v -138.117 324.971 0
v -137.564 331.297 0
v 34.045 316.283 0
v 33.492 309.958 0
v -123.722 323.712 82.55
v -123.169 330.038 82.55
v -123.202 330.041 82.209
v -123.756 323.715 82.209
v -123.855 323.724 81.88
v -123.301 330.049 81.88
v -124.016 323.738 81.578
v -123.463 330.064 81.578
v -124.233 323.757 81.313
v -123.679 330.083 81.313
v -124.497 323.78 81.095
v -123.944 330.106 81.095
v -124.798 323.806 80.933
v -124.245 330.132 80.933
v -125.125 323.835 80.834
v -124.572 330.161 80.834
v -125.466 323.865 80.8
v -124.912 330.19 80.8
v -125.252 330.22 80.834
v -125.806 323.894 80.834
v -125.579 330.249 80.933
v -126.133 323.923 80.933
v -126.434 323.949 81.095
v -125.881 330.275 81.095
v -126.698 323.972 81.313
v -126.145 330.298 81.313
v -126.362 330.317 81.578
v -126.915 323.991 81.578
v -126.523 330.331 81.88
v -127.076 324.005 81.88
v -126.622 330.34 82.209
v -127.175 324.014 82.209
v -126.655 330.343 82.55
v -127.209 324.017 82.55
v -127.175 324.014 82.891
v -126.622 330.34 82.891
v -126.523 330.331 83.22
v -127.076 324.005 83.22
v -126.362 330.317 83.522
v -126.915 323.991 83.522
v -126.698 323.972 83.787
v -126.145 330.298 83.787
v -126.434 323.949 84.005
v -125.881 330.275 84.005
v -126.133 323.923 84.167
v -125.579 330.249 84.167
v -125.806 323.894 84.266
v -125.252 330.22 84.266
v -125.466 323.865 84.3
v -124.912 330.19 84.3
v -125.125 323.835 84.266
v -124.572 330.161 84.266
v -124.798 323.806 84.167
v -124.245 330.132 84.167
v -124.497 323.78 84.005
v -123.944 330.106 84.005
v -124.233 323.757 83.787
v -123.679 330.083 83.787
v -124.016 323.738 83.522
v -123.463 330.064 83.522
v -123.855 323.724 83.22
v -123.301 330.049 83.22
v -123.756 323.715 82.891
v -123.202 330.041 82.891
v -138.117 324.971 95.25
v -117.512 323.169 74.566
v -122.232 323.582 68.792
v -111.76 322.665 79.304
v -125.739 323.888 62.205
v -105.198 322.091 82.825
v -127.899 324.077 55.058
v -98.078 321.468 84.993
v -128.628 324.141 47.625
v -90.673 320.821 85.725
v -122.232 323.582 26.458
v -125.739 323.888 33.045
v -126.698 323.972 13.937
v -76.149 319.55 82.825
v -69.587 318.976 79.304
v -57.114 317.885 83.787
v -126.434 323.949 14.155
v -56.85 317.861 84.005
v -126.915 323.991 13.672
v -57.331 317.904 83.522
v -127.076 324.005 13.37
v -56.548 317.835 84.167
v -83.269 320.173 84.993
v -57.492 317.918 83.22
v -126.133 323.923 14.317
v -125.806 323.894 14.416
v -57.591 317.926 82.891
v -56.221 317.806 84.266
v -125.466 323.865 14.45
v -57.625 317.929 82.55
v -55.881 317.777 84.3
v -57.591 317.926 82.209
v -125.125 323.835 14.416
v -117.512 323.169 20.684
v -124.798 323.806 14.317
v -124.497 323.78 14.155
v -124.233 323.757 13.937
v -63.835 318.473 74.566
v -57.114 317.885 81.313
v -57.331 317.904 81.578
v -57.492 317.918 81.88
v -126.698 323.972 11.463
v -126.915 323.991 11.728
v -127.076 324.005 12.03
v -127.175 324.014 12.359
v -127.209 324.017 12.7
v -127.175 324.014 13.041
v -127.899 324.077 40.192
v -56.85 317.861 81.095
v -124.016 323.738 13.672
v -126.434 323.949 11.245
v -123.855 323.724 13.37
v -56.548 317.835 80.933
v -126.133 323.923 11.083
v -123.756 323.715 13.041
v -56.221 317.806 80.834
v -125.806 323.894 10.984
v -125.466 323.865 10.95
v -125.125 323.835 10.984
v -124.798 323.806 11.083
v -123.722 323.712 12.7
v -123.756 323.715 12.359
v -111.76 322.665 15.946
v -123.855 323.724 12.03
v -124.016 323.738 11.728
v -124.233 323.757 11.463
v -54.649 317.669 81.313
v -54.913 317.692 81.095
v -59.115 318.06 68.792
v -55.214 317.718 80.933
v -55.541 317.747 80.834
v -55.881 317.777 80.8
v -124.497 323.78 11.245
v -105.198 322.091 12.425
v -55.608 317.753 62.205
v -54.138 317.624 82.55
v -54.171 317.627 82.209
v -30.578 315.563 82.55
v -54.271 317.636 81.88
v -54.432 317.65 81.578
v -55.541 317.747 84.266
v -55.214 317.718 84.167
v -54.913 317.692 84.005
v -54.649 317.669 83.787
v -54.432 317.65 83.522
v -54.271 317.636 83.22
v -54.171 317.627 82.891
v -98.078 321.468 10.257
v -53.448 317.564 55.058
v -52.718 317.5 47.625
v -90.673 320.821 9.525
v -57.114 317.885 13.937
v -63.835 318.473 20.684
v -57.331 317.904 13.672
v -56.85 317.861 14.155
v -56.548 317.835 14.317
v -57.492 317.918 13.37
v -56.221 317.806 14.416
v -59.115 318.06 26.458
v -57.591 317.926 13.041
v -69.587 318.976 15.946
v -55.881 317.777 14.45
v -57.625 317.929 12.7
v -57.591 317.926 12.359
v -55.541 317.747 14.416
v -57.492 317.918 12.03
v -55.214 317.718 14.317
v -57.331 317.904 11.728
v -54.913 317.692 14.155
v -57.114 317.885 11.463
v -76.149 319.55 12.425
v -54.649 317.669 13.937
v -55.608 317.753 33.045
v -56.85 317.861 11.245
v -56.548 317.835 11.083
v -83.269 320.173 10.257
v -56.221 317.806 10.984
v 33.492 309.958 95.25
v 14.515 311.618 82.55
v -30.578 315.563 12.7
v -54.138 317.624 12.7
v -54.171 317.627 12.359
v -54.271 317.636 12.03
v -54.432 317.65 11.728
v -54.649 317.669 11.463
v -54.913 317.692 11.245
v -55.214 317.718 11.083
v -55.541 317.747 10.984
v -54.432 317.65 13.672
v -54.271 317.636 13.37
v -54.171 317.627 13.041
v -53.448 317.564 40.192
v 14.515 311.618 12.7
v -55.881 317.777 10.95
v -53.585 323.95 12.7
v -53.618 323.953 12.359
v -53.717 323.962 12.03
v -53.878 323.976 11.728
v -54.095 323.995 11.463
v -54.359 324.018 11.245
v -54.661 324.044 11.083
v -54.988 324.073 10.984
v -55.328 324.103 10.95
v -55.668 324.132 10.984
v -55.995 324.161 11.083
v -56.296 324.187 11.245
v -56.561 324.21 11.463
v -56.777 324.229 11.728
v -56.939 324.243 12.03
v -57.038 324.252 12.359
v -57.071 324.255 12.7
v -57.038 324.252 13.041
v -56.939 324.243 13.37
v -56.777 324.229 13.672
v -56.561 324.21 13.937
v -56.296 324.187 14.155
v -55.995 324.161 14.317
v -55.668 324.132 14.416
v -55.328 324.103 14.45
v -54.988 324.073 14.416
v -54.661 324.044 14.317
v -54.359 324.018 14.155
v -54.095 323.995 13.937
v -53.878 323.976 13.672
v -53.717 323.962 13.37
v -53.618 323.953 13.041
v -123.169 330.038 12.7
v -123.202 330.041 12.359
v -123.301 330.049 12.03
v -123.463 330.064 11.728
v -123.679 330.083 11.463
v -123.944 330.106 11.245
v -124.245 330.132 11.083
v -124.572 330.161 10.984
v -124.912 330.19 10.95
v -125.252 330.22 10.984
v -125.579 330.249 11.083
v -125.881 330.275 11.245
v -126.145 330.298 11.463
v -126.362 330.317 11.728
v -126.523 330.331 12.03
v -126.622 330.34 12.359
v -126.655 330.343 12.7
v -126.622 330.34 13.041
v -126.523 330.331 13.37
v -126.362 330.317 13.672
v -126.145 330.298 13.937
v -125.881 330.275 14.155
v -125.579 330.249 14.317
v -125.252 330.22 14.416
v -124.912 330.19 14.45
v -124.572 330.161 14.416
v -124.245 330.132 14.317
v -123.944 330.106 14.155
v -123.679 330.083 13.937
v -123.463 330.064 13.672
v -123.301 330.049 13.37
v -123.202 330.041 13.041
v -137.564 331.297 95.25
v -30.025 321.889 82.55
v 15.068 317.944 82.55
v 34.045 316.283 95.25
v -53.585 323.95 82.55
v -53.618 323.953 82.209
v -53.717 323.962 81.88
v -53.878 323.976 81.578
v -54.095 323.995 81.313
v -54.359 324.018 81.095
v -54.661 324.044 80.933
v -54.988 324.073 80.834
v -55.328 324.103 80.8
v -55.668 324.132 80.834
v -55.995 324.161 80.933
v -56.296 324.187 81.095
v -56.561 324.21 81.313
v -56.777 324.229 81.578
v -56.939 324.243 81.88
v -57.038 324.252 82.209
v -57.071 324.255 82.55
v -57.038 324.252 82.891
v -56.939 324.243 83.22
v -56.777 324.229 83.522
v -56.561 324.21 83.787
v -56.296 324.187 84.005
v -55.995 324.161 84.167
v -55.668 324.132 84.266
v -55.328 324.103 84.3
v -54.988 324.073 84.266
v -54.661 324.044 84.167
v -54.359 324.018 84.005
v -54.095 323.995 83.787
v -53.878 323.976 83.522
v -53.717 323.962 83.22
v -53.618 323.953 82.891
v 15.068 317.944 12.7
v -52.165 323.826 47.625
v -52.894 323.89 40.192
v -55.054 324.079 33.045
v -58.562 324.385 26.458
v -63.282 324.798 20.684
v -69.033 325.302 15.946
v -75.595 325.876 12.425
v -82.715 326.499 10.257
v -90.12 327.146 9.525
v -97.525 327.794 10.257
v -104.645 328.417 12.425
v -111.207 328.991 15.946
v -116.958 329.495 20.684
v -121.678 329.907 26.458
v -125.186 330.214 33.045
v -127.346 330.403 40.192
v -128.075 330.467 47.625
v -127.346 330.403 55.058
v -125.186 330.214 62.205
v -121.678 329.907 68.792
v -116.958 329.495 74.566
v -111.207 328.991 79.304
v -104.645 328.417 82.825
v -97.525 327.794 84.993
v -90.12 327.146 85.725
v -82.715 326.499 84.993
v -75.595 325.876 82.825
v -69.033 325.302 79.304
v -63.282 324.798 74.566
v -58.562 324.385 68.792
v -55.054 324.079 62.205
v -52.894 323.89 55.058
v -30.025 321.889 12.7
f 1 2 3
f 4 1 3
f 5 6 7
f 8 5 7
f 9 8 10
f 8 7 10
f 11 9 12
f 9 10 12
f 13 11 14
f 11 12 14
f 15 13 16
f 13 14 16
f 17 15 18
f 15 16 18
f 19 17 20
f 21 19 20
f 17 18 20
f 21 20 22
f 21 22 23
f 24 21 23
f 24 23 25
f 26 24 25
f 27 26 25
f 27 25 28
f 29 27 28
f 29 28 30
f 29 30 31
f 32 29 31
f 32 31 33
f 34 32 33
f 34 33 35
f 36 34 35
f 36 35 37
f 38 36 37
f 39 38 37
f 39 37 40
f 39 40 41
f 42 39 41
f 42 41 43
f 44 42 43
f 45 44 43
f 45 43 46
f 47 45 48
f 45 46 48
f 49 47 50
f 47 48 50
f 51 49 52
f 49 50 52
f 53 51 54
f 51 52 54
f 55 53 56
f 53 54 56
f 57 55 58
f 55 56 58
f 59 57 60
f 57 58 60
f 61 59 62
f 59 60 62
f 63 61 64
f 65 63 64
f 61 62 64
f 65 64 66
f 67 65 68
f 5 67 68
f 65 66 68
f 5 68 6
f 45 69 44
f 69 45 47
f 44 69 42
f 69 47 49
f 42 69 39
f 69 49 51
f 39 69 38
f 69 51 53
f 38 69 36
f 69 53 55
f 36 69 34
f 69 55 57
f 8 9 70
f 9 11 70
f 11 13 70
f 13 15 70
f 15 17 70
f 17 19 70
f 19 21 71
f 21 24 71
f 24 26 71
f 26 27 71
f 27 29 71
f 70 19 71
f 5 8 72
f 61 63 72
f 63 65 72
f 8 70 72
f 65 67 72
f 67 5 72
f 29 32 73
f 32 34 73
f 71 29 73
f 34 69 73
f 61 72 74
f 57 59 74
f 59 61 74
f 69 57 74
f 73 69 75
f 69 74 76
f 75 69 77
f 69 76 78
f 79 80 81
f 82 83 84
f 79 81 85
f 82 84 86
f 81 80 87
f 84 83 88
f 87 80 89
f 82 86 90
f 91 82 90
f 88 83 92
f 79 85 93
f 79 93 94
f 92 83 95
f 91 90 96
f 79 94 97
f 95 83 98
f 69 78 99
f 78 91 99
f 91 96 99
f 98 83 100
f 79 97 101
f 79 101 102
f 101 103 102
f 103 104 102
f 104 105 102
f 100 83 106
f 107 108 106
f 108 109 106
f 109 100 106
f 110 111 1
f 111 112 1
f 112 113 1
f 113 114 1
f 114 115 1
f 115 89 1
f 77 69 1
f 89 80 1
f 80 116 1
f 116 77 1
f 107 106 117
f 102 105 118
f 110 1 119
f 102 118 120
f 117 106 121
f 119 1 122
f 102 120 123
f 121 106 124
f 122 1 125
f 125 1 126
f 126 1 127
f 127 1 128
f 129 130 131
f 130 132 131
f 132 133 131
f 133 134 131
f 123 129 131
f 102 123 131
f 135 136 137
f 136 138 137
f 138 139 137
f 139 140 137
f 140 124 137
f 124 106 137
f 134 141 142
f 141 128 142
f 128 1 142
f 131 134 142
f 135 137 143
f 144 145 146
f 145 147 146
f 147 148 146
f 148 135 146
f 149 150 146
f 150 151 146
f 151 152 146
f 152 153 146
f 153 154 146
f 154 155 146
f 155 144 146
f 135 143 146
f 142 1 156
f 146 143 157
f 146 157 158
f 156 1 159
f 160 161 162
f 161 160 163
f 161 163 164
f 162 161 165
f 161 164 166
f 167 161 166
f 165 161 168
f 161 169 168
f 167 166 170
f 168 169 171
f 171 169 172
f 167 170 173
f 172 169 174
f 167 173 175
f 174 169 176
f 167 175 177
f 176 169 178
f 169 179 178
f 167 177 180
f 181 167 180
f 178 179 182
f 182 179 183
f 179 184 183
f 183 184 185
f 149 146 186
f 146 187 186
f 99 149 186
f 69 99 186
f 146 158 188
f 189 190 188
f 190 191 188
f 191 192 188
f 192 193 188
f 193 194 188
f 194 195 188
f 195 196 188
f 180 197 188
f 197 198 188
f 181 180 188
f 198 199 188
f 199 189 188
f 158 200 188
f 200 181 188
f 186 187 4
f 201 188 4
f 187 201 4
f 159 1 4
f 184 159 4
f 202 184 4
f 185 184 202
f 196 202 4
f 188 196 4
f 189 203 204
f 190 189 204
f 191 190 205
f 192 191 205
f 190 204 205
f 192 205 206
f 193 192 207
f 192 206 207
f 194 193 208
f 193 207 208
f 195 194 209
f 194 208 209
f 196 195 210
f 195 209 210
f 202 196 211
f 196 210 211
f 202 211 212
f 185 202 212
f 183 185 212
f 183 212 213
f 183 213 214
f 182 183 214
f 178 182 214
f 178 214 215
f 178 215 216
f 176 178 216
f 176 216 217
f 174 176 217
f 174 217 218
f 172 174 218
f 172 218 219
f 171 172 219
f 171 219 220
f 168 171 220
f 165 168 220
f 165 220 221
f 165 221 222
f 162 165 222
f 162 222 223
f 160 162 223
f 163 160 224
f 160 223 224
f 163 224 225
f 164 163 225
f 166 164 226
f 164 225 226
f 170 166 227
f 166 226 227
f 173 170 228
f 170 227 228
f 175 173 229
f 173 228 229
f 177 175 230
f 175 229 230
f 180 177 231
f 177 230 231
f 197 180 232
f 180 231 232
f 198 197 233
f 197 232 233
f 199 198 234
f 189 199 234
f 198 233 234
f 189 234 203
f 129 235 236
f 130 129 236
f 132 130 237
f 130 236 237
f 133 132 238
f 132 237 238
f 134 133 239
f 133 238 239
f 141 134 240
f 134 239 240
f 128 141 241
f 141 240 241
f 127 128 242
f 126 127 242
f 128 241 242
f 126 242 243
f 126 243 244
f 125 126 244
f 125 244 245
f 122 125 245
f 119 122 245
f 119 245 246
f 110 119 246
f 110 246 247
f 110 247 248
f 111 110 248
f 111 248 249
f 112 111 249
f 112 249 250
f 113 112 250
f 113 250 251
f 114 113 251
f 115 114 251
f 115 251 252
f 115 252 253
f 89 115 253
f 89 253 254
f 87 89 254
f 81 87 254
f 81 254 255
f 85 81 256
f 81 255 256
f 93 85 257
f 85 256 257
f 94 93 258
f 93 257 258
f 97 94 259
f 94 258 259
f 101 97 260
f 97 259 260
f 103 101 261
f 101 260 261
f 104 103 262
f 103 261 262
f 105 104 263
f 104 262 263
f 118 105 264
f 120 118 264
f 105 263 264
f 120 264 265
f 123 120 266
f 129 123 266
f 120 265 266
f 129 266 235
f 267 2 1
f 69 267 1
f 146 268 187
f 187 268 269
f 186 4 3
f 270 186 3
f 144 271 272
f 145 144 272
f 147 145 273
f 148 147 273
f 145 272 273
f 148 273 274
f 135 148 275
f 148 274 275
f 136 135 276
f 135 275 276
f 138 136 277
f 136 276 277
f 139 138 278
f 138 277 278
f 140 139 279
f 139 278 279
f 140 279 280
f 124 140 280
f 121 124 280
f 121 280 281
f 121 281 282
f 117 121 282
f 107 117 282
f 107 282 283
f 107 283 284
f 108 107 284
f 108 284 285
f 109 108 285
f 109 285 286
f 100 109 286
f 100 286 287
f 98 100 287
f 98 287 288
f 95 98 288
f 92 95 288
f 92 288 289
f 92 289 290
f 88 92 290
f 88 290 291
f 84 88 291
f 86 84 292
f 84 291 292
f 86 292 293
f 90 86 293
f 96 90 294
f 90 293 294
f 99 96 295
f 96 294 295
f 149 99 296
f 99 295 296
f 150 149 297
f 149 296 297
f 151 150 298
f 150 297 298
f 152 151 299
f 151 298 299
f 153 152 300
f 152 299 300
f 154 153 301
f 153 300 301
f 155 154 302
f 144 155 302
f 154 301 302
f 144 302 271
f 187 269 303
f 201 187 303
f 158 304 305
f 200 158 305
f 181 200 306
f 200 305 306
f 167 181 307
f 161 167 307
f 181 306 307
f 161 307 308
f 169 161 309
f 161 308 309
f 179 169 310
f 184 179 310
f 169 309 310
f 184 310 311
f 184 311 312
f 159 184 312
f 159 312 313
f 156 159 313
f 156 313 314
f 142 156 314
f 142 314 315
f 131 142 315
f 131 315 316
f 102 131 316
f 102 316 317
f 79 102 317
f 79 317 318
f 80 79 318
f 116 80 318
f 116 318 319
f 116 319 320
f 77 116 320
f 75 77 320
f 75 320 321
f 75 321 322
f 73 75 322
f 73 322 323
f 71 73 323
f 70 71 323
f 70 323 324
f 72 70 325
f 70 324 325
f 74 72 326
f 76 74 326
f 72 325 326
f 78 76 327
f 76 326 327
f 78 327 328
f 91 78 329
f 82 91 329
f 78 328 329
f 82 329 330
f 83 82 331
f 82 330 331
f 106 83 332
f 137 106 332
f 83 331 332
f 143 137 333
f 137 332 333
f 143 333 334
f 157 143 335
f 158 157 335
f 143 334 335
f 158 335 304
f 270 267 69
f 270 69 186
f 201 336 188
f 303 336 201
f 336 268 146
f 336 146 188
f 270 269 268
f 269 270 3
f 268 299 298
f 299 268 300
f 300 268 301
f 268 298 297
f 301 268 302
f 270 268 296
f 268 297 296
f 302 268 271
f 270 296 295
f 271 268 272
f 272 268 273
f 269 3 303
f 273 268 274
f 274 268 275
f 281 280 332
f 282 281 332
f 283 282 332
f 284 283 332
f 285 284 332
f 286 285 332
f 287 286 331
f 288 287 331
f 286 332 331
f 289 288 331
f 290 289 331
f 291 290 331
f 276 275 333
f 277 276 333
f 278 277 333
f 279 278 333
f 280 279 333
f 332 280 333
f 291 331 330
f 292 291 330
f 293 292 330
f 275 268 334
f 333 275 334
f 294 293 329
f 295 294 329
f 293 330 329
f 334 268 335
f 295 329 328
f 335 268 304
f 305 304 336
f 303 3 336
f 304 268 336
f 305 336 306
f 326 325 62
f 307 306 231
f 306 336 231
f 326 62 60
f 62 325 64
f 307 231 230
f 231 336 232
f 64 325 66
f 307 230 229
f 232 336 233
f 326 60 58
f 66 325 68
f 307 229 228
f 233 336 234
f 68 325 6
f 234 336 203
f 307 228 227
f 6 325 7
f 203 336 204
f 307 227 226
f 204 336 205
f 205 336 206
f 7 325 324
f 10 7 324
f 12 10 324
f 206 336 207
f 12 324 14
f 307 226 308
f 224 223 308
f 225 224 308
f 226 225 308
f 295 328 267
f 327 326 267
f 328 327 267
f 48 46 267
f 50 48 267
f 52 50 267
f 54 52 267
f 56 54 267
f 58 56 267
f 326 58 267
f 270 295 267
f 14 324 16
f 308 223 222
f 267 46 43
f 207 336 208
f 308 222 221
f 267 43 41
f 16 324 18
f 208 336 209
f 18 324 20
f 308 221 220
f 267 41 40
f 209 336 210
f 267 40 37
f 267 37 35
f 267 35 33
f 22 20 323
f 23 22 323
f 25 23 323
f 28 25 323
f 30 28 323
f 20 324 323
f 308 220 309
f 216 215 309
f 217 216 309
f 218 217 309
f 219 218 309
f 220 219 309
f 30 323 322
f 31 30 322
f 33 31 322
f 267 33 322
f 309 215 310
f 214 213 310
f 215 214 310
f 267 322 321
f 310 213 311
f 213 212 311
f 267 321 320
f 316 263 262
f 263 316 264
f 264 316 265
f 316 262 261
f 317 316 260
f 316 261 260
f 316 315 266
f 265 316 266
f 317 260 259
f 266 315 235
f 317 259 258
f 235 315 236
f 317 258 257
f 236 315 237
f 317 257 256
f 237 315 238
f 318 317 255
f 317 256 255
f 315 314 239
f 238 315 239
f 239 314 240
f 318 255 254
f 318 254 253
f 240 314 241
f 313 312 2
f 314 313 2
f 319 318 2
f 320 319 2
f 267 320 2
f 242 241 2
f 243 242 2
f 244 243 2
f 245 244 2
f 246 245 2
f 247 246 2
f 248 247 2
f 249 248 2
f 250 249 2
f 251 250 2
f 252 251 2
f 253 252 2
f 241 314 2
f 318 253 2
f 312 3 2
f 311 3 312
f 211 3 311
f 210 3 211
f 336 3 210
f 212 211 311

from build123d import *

# Parameters (mm, degrees)
BOSS_EXTRUDE1_DEPTH = 95.25
SKETCH3_R           = 38.1
CUT_EXTRUDE1_DEPTH  = 22.306729365
SKETCH4_R           = 1.75
CUT_EXTRUDE2_DEPTH  = 22.306729365
SKETCH5_W           = 45.264743179
SKETCH5_H           = 69.85
CUT_EXTRUDE3_DEPTH  = 22.306729365


with BuildPart() as part:
    # Sketch2 → Boss-Extrude1 (new body)
    with BuildSketch(Plane.XY):
        Polygon((-137.563755829, 331.29726238), (-138.117194795, 324.971426047), (33.492029028, 309.957564406), (34.045467994, 316.283400739), align=None)
    extrude(amount=BOSS_EXTRUDE1_DEPTH)

    # Sketch3 → Cut-Extrude1 (cut, through all)
    with BuildSketch(Plane(origin=(27.719631662, 316.836839705, 0), x_dir=(0.996194698, -0.087155743, 0), z_dir=(0.087155743, 0.996194698, 0))):
        with Locations((-118.289743179, -47.625)):
            Circle(SKETCH3_R)
    extrude(amount=-CUT_EXTRUDE1_DEPTH, mode=Mode.SUBTRACT)

    # Sketch4 → Cut-Extrude2 (cut, through all)
    with BuildSketch(Plane(origin=(27.719631662, 316.836839705, 0), x_dir=(0.996194698, -0.087155743, 0), z_dir=(0.087155743, 0.996194698, 0))):
        with Locations((-153.214743179, -12.7)):
            Circle(SKETCH4_R)
        with Locations((-153.214743179, -82.55)):
            Circle(SKETCH4_R)
        with Locations((-83.364743179, -82.55)):
            Circle(SKETCH4_R)
        with Locations((-83.364743179, -12.7)):
            Circle(SKETCH4_R)
    extrude(amount=-CUT_EXTRUDE2_DEPTH, mode=Mode.SUBTRACT)

    # Sketch5 → Cut-Extrude3 (cut, through all)
    with BuildSketch(Plane(origin=(27.719631662, 316.836839705, 0), x_dir=(0.996194698, -0.087155743, 0), z_dir=(0.087155743, 0.996194698, 0))):
        with Locations((-35.332371589, -47.625)):
            Rectangle(SKETCH5_W, SKETCH5_H)
    extrude(amount=-CUT_EXTRUDE3_DEPTH, mode=Mode.SUBTRACT)


solid = part.part
